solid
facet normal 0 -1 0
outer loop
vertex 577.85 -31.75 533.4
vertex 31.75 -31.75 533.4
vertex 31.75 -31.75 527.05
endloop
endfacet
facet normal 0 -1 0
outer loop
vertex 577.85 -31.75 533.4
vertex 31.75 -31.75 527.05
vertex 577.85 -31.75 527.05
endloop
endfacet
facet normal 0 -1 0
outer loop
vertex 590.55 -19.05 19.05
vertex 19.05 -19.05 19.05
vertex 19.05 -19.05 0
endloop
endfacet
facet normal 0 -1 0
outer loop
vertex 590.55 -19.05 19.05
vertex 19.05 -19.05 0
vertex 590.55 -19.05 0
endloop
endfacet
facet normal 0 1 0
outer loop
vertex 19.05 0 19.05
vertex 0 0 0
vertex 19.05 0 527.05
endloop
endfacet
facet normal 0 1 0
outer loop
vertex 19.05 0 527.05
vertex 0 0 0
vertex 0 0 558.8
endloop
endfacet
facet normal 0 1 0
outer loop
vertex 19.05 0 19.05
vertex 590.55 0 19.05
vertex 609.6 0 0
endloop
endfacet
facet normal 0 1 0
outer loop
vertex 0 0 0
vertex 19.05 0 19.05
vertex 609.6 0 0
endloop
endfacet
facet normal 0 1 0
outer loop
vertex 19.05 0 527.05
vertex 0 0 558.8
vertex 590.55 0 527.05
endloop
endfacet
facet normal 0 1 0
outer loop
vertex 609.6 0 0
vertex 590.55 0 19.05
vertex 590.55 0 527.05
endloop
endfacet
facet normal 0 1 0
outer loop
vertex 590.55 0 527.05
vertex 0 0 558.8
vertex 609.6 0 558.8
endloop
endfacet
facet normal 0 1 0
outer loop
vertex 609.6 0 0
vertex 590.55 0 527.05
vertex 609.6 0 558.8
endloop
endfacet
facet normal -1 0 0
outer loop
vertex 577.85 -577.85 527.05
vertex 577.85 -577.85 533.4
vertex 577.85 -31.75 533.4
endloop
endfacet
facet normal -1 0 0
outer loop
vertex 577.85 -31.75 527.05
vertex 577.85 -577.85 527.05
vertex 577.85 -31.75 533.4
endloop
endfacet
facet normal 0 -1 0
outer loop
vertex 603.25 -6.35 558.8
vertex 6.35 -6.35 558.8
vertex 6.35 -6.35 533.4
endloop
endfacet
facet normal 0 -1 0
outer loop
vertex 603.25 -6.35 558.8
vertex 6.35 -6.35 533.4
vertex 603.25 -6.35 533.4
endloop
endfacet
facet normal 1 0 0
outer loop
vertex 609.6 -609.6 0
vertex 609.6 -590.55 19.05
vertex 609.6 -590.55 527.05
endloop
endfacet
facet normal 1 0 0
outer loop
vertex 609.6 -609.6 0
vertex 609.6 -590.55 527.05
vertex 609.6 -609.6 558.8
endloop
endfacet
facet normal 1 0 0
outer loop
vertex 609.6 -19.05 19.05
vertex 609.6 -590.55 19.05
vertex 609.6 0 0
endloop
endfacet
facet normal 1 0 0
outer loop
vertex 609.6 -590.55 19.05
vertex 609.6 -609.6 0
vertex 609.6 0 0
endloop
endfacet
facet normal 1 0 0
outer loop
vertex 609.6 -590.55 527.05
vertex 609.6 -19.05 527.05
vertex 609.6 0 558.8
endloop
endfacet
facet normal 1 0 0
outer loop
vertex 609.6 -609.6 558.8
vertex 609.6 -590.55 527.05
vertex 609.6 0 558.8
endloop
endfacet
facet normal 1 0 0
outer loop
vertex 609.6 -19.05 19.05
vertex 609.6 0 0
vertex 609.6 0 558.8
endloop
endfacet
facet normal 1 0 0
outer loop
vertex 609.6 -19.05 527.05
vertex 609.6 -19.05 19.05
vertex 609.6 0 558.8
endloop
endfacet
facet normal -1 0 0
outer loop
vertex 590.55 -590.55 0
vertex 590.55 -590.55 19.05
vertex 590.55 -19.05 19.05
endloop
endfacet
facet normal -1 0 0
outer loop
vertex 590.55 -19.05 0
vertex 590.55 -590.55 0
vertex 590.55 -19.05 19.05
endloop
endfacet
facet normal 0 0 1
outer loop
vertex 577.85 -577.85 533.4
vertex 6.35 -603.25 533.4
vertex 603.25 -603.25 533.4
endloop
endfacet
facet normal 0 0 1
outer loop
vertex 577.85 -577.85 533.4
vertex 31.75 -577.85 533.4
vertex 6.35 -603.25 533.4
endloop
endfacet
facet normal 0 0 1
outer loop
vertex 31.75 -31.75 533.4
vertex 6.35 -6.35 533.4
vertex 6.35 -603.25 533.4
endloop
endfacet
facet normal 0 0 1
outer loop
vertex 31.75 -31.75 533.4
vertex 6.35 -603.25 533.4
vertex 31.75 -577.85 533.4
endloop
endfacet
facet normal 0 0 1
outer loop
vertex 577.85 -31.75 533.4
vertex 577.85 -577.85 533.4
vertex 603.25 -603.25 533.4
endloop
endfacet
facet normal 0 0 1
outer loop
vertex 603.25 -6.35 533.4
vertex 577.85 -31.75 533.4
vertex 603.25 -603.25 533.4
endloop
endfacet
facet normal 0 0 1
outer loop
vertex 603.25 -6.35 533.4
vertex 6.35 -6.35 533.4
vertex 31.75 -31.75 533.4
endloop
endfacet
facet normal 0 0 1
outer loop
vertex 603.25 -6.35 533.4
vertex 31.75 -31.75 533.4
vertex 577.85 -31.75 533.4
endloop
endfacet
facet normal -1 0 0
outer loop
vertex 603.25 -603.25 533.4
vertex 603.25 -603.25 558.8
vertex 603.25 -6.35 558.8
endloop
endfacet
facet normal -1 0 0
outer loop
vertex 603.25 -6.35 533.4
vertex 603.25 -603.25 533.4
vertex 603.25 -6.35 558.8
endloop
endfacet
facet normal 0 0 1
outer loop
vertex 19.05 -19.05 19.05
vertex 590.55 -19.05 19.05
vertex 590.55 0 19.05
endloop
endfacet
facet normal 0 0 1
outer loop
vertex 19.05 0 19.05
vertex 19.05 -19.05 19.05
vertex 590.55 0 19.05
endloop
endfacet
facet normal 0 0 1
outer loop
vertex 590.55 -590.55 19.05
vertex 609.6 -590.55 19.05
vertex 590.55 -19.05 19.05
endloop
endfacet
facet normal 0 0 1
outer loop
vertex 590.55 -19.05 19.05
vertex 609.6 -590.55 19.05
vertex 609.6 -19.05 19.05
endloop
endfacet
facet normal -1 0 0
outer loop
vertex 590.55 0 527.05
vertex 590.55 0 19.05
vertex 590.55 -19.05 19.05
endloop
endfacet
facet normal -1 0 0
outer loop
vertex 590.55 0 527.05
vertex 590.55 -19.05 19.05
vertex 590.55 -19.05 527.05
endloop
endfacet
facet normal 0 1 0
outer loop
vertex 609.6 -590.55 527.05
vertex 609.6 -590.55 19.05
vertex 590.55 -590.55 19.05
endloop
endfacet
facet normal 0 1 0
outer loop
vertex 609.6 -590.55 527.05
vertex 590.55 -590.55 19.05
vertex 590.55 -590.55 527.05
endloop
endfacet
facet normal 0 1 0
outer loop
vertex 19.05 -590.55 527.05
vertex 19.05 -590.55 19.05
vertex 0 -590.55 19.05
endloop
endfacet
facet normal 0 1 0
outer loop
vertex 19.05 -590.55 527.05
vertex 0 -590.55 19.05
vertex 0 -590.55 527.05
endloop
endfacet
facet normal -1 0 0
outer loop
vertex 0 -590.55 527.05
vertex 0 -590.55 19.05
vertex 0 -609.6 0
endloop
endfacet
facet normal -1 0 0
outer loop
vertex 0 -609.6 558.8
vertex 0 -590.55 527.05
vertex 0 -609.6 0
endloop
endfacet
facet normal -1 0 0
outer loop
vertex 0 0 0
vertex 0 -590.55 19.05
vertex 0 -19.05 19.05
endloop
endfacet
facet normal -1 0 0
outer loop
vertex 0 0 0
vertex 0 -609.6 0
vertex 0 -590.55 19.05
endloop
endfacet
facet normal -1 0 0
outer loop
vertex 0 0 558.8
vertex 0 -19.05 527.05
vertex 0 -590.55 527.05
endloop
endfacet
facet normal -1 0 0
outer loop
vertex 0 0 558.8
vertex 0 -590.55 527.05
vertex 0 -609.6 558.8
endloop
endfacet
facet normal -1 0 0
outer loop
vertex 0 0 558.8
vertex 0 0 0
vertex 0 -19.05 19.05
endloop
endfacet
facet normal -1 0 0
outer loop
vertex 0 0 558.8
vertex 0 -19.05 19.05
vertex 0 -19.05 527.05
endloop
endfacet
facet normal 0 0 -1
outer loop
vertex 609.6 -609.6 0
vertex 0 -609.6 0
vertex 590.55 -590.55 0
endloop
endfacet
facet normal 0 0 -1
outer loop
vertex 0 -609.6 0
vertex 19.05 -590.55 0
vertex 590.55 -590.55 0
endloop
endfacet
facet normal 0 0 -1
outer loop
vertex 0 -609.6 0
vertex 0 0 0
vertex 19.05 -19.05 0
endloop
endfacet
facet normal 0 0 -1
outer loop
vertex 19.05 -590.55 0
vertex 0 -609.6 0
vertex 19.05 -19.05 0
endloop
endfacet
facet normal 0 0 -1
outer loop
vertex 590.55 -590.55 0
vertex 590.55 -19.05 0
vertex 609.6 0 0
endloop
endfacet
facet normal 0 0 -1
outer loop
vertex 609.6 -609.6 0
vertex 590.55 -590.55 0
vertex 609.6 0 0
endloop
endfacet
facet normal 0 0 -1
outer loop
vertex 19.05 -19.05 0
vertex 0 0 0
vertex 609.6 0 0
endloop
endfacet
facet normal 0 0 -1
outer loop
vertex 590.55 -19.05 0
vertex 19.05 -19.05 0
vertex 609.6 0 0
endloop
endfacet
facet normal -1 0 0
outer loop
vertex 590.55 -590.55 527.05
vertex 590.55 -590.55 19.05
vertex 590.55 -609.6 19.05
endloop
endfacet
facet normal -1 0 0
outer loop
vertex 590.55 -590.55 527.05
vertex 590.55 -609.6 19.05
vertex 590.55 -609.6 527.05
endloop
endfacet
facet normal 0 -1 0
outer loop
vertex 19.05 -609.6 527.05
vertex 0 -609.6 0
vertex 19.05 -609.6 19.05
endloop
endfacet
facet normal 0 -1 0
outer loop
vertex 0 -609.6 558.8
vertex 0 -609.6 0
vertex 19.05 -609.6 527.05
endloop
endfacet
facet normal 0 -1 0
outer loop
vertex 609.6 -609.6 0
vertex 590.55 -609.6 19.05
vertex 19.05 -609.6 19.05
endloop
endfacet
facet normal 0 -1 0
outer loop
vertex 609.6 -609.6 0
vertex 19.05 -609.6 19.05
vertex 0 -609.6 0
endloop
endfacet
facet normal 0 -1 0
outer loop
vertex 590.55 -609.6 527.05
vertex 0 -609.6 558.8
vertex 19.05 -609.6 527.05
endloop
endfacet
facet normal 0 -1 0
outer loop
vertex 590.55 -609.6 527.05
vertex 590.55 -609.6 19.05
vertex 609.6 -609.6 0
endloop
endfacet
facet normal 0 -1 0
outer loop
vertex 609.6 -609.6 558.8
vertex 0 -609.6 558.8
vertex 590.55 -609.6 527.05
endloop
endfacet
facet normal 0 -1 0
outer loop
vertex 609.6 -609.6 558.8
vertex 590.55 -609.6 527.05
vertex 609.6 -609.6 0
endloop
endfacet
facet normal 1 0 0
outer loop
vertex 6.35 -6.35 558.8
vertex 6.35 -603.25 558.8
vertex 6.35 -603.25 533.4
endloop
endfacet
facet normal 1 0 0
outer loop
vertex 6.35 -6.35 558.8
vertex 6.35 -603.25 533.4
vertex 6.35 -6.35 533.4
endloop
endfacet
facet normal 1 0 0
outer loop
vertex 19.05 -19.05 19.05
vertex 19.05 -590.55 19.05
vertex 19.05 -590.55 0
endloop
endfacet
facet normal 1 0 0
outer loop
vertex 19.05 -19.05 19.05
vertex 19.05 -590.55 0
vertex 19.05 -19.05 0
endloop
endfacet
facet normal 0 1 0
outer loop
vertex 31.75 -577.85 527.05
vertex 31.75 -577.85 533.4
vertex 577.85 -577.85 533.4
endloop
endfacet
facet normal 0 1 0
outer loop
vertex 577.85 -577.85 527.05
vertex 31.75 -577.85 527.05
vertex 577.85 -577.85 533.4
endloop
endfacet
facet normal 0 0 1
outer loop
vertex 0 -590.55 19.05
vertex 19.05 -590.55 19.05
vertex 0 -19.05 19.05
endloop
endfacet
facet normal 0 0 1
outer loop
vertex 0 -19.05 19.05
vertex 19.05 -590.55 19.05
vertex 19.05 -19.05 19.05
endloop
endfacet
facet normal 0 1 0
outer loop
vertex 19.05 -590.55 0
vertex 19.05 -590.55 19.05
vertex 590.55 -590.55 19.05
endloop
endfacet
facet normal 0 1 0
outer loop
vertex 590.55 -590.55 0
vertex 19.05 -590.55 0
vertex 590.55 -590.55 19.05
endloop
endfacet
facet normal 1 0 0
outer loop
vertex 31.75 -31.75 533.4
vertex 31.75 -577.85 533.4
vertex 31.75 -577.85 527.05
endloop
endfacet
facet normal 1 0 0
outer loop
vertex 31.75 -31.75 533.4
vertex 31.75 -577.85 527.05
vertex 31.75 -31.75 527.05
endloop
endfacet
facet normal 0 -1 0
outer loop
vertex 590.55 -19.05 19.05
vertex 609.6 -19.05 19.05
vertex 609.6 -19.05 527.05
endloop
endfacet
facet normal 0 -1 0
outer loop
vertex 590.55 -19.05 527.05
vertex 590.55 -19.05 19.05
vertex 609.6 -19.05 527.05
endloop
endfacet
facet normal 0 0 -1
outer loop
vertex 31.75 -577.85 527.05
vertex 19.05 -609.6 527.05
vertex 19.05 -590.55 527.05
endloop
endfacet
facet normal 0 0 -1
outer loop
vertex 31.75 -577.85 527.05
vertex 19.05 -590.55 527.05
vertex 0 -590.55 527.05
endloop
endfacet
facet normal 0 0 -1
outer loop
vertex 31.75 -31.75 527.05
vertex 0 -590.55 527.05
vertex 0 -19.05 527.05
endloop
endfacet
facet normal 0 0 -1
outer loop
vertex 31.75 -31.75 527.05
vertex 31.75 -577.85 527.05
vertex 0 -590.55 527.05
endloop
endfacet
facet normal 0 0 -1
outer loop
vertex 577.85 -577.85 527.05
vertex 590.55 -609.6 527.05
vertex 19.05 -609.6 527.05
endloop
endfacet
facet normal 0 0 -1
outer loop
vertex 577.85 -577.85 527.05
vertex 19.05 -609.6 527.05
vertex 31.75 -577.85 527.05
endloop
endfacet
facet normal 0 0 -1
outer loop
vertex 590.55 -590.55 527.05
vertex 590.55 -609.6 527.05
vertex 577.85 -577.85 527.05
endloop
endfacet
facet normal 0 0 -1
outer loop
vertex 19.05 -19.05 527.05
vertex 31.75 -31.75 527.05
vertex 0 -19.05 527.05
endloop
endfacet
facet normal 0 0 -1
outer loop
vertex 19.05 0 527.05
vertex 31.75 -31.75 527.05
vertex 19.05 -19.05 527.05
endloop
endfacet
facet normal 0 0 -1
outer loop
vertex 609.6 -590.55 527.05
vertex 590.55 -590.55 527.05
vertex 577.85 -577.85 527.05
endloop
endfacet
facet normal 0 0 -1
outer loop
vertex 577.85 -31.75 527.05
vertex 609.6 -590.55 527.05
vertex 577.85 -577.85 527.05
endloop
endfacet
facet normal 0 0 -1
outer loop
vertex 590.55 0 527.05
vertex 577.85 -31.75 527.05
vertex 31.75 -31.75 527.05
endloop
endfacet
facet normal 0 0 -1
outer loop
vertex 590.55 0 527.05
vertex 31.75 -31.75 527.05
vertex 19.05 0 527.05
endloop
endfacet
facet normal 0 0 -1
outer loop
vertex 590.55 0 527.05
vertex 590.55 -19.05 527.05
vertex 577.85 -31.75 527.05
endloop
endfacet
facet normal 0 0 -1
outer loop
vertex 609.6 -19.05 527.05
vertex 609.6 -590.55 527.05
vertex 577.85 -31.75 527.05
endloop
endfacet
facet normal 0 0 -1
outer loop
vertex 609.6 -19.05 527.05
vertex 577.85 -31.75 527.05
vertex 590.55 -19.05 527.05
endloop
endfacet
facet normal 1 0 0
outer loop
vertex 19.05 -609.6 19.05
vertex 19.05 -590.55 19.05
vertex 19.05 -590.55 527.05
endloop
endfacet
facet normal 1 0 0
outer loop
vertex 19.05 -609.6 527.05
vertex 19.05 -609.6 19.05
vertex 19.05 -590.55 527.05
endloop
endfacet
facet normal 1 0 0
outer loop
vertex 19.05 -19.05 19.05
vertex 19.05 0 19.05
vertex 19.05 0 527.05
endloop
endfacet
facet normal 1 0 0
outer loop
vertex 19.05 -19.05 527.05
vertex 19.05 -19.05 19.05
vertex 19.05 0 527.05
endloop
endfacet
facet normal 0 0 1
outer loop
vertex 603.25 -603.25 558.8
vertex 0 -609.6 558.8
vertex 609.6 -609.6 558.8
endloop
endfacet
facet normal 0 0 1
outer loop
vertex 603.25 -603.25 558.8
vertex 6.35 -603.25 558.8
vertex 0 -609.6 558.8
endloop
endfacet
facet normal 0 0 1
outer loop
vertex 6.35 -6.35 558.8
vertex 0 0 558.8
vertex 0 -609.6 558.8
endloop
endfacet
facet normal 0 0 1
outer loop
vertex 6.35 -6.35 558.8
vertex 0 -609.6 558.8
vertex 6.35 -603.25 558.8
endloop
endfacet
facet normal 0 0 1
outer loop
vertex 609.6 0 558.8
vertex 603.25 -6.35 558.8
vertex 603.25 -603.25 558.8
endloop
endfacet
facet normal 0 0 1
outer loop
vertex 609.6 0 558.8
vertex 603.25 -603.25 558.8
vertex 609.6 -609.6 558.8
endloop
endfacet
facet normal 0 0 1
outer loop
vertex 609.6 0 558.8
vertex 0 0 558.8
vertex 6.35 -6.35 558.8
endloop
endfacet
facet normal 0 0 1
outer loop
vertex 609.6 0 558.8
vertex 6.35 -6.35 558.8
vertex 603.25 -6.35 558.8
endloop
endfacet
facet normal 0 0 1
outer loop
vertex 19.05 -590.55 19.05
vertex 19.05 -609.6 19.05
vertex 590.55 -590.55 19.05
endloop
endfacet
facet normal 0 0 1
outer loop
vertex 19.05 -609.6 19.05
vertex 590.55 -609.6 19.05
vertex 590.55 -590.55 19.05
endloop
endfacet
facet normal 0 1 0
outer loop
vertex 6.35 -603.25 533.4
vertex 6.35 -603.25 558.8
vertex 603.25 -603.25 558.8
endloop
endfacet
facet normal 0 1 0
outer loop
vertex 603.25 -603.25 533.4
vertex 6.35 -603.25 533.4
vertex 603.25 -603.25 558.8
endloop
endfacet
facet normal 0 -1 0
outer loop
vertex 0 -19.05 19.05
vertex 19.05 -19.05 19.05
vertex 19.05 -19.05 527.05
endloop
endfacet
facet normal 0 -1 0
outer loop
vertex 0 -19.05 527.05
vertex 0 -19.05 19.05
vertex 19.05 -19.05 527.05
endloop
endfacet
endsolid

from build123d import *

# Parameters (mm, degrees)
F0_W     = 609.6
F0_H     = 558.8
F0_W_2   = 571.5
F0_H_2   = 508
F1_DEPTH = 609.6
F2_W     = 571.5
F2_H     = 508
F3_DEPTH = 609.601
F4_W     = 596.9
F4_H     = 596.9
F5_DEPTH = 25.4
F6_W     = 546.1
F6_H     = 546.1
F7_DEPTH = 6.35
F8_W     = 571.5
F8_H     = 571.5
F9_DEPTH = 19.05


with BuildPart() as f1:
    # F0 (on Front) → F1 (new body)
    with BuildSketch(Plane.XZ):
        with Locations((304.8, 279.4)):
            Rectangle(F0_W, F0_H)
        with Locations((304.8, 273.05)):
            Rectangle(F0_W_2, F0_H_2, mode=Mode.SUBTRACT)
    extrude(amount=F1_DEPTH)

    # F2 (on face) → F3 (cut, through all)
    with BuildSketch(Plane.YZ.offset(609.6)):
        with Locations((-304.8, 273.05)):
            Rectangle(F2_W, F2_H)
    extrude(amount=-F3_DEPTH, mode=Mode.SUBTRACT)

    # F4 (on face) → F5 (cut)
    with BuildSketch(Plane.XY.offset(558.8)):
        with Locations((304.8, -304.8)):
            Rectangle(F4_W, F4_H)
    extrude(amount=-F5_DEPTH, mode=Mode.SUBTRACT)

    # F6 (on face) → F7 (cut, through all)
    with BuildSketch(Plane.XY.offset(533.4)):
        with Locations((304.8, -304.8)):
            Rectangle(F6_W, F6_H)
    extrude(amount=-F7_DEPTH, mode=Mode.SUBTRACT)

    # F8 (on face) → F9 (cut, through all)
    with BuildSketch(Plane.XY.offset(19.05)):
        with Locations((304.8, -304.8)):
            Rectangle(F8_W, F8_H)
    extrude(amount=-F9_DEPTH, mode=Mode.SUBTRACT)


solid = f1.part
